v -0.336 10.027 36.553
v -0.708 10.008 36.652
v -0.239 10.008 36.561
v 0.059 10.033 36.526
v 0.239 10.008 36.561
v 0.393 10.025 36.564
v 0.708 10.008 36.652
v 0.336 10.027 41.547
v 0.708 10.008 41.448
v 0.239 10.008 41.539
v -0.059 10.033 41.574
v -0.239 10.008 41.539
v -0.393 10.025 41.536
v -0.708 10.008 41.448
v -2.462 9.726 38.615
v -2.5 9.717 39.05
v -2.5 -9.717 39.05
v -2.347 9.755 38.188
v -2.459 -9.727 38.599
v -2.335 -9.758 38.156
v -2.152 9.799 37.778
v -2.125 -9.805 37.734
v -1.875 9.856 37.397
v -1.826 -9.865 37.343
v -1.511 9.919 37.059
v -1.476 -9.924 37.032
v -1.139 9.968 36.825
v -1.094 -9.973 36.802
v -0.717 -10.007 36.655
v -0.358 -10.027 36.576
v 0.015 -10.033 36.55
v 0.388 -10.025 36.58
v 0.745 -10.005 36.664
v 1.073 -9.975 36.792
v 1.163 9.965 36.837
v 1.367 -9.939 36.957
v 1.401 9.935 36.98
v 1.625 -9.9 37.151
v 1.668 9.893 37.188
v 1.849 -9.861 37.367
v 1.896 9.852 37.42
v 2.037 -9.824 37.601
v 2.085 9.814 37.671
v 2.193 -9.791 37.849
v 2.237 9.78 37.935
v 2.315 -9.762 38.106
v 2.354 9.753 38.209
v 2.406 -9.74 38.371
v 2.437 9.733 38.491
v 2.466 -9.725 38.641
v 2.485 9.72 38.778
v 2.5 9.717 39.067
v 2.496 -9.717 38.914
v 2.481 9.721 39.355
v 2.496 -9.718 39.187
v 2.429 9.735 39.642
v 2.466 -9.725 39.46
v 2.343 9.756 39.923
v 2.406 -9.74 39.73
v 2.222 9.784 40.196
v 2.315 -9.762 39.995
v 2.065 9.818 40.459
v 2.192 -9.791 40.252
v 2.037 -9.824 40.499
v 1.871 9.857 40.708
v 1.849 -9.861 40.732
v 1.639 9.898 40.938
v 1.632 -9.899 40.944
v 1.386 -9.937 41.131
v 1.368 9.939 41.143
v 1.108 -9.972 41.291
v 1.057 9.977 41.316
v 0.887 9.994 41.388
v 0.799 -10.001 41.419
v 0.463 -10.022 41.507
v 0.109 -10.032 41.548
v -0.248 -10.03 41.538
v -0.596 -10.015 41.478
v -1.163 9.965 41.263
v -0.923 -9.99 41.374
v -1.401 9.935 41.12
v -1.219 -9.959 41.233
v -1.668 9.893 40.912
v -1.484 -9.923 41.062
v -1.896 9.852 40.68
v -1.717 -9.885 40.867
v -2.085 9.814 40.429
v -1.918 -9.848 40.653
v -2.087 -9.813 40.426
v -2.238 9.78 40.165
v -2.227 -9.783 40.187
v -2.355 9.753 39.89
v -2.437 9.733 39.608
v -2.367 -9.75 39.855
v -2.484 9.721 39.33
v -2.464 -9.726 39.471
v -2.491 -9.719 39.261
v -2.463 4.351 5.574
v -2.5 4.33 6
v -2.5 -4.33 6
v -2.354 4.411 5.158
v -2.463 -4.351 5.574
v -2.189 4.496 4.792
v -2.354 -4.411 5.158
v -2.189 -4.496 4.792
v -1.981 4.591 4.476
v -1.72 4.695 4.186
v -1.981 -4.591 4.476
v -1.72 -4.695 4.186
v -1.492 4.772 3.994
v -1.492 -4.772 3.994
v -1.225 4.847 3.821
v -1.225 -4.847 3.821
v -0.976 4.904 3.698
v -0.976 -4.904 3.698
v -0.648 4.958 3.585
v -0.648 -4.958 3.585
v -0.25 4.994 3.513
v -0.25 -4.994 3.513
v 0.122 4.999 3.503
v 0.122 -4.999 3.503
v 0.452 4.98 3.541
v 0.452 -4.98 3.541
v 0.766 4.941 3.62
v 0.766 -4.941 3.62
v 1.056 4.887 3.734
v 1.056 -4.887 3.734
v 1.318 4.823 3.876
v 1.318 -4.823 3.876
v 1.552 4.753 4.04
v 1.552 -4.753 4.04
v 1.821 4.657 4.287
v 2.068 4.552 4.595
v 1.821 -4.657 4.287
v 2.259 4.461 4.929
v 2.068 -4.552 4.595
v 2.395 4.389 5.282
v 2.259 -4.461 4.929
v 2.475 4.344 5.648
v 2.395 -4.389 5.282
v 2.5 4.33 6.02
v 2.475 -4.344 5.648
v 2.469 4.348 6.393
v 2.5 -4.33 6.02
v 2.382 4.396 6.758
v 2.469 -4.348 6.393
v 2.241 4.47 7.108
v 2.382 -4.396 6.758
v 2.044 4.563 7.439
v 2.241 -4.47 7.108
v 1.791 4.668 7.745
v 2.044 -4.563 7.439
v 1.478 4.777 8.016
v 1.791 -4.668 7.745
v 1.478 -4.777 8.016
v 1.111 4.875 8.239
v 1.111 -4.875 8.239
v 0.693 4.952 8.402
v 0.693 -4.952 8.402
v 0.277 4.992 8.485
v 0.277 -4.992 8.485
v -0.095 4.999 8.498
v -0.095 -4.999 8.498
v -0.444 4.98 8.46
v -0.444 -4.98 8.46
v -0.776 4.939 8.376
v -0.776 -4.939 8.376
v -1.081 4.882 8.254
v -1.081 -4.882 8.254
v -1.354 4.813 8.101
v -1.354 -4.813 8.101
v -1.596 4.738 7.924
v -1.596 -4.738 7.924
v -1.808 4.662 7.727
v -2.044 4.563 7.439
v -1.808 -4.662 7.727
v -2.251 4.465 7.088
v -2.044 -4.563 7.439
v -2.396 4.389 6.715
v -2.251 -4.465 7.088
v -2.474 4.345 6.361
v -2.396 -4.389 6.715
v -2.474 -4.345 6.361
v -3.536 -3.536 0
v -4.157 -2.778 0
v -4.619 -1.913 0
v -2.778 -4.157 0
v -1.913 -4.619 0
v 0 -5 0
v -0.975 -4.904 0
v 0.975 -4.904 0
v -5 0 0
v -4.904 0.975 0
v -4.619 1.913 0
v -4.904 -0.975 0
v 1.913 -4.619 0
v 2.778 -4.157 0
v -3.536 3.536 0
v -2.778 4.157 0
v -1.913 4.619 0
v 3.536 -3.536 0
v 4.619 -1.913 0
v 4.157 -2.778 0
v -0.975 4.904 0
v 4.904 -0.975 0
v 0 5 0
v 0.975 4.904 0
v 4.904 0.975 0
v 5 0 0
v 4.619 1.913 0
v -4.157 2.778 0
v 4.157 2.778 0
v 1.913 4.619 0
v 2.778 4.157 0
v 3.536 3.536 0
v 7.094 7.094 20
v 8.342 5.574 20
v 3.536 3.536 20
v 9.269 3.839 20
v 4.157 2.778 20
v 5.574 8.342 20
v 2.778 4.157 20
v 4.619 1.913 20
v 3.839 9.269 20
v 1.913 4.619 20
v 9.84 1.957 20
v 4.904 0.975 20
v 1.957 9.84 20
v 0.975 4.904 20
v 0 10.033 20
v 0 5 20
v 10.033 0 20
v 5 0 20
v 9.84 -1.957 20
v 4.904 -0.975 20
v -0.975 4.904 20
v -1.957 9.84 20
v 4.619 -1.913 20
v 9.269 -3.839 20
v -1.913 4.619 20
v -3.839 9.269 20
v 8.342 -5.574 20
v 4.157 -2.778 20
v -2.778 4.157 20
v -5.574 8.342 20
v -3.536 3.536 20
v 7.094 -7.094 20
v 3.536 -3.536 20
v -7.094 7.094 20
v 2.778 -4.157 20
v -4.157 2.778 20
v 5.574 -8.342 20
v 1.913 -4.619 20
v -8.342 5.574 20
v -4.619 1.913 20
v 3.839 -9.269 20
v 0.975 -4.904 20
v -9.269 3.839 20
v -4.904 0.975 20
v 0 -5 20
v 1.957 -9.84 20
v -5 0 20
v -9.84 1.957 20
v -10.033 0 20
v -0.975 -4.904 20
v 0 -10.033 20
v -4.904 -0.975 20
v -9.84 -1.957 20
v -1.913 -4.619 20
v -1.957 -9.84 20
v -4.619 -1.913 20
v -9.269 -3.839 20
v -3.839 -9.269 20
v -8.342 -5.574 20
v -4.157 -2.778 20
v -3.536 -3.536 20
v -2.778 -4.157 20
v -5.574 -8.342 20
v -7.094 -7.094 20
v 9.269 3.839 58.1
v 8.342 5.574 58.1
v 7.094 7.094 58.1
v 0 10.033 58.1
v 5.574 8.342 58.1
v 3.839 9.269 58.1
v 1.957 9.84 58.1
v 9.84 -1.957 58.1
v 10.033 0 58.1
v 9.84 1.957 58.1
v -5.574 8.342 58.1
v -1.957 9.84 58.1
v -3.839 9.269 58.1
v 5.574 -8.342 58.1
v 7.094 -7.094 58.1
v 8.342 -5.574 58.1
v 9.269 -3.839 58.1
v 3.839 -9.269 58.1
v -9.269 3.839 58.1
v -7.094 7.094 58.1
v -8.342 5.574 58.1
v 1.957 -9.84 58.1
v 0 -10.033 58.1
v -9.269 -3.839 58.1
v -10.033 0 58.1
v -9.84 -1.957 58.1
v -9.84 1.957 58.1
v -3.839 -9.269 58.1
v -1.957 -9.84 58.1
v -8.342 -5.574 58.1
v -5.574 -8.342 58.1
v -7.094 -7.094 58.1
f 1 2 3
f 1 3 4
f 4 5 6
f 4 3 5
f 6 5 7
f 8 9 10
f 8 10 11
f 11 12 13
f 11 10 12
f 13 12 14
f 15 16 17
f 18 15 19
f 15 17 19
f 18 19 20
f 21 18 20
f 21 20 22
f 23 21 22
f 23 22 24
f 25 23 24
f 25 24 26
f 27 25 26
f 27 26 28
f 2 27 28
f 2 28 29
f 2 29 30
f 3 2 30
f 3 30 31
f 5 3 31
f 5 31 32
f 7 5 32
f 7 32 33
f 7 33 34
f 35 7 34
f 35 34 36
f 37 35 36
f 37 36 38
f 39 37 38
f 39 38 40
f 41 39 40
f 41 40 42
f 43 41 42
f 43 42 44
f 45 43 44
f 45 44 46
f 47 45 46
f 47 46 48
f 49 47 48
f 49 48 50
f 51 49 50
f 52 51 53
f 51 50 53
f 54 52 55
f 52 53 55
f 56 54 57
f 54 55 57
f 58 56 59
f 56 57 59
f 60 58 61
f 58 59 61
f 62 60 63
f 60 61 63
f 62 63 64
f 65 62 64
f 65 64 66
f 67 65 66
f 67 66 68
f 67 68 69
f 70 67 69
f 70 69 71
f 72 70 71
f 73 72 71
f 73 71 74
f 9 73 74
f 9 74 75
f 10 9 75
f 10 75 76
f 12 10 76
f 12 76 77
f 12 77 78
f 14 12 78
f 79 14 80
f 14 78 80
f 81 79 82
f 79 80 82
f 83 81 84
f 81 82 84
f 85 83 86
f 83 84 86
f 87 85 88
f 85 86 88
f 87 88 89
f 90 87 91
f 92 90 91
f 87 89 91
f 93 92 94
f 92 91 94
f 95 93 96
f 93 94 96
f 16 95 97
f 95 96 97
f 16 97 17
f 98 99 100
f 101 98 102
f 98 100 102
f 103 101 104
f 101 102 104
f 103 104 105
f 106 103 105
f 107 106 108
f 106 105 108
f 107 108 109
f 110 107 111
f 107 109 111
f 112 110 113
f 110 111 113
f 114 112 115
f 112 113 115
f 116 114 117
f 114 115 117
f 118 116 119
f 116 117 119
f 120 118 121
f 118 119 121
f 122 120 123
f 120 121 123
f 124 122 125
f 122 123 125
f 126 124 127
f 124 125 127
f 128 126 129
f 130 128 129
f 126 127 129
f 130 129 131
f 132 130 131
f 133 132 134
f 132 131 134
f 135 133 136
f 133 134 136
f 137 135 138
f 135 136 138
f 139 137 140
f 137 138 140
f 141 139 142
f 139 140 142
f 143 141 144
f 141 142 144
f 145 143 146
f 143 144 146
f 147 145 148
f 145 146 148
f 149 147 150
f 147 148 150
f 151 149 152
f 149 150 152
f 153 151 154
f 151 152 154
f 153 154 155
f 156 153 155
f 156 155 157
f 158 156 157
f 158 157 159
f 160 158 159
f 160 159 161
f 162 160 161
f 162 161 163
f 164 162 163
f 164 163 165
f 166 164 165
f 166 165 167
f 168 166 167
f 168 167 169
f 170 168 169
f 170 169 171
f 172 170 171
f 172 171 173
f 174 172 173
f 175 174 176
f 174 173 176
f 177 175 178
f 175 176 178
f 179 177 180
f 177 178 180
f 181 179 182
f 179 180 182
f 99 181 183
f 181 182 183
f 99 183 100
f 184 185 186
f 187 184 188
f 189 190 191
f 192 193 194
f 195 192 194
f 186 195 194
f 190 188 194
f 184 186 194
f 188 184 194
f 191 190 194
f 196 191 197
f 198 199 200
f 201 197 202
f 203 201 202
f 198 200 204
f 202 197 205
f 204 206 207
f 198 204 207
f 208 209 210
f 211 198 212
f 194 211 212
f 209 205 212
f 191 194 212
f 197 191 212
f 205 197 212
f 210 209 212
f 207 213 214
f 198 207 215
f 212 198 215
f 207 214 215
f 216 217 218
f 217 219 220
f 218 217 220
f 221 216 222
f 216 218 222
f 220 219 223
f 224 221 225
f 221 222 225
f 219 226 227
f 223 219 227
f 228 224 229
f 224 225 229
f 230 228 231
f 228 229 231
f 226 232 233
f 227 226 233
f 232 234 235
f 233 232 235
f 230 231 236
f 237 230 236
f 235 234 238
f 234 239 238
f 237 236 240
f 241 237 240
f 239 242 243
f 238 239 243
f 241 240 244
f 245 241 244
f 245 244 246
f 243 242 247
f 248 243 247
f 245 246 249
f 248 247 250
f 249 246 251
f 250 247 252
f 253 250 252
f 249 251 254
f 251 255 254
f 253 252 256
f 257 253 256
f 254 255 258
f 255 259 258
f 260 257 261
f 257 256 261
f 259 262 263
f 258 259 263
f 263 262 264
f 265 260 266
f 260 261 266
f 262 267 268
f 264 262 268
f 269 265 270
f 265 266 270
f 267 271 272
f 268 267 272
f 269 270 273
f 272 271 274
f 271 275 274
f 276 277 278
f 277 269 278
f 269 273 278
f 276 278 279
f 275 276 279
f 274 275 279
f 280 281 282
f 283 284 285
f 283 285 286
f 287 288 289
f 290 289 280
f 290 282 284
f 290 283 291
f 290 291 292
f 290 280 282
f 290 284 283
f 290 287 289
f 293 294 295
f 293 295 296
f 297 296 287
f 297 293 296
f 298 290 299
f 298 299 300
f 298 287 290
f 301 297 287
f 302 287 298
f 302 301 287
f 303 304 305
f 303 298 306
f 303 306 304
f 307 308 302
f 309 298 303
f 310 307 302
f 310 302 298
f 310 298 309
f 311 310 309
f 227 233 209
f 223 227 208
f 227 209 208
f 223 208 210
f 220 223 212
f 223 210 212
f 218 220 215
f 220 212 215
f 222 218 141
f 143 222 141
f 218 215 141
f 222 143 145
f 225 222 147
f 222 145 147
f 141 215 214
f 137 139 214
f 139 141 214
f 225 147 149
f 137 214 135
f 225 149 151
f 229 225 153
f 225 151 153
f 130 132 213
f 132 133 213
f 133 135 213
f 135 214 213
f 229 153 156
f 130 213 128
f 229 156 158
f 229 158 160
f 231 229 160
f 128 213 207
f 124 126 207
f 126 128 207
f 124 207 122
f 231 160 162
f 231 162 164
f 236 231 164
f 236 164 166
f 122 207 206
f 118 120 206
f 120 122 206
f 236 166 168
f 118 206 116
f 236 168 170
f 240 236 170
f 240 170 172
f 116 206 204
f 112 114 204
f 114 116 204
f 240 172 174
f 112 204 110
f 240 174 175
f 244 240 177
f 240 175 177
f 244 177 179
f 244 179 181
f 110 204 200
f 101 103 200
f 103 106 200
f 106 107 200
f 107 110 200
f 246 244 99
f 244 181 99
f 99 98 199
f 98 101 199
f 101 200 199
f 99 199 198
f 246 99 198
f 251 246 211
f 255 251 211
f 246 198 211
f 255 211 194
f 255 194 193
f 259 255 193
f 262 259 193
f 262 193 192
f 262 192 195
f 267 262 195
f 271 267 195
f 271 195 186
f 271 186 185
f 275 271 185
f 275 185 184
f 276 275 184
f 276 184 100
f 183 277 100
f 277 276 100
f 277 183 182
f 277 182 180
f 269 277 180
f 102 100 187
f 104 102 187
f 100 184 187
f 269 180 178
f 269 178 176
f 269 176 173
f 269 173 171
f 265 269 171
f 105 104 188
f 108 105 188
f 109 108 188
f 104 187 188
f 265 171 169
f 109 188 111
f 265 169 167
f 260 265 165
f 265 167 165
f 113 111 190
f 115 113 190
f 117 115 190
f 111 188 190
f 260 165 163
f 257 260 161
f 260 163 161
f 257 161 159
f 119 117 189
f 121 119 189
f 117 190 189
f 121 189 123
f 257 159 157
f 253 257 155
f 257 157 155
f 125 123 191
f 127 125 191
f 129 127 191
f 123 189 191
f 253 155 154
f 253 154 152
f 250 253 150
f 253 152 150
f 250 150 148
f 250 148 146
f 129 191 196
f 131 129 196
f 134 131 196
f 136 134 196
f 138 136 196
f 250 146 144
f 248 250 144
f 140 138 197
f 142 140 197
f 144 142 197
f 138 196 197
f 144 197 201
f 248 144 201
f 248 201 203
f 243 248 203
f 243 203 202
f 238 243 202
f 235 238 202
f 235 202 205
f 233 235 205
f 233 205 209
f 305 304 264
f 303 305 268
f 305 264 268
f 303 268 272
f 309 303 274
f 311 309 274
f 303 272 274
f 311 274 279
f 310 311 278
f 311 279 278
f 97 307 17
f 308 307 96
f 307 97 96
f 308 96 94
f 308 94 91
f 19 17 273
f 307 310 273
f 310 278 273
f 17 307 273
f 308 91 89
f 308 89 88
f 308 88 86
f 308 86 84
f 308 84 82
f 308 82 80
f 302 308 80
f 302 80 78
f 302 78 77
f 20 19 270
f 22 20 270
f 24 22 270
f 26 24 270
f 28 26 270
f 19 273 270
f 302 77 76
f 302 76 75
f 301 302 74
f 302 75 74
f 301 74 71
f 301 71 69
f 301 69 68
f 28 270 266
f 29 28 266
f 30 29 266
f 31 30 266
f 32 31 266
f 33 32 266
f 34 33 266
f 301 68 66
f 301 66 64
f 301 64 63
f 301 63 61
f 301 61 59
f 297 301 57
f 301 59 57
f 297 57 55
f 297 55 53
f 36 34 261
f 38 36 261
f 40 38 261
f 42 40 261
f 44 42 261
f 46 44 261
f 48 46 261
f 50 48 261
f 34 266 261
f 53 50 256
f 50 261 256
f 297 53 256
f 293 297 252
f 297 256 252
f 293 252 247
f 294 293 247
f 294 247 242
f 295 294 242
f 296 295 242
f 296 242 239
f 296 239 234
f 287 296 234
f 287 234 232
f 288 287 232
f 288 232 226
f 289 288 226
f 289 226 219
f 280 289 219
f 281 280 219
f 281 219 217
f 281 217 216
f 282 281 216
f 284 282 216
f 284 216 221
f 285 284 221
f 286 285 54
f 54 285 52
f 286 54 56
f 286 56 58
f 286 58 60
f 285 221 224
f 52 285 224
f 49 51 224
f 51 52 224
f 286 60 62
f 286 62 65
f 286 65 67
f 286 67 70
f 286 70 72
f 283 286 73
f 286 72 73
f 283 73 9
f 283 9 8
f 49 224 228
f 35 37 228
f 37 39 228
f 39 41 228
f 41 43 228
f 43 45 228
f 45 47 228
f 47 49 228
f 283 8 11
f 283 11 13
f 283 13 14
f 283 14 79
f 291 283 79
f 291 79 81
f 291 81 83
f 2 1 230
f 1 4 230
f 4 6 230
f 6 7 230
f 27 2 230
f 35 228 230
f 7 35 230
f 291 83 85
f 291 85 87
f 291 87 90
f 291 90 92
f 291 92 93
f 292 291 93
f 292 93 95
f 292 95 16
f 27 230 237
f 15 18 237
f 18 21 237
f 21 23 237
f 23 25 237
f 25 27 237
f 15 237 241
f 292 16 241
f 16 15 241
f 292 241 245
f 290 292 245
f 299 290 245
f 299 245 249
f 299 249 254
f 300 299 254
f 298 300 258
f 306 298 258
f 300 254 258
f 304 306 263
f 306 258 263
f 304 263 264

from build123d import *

# Parameters (mm, degrees)
SKETCH1_R                       = 5
BOSS_EXTRUDE1_DEPTH             = 20
SKETCH2_R                       = 10.033
BOSS_EXTRUDE2_DEPTH             = 38.1
F_5_0MM_DOWEL_HOLE1_D           = 5
F_5_0MM_DOWEL_HOLE1_CSINK_D     = 5.05
F_5_0MM_DOWEL_HOLE1_CSINK_ANGLE = 90


with BuildPart() as part:
    # Sketch1 → Boss-Extrude1 (new body)
    with BuildSketch(Plane.XY):
        Circle(SKETCH1_R)
    extrude(amount=BOSS_EXTRUDE1_DEPTH)

    # Sketch2 → Boss-Extrude2 (add)
    with BuildSketch(Plane.XY.offset(20)):
        with Locations(Location((0, 0, 0), (0, 0, 180))):
            Circle(SKETCH2_R)
    extrude(amount=BOSS_EXTRUDE2_DEPTH)

    # Ø5.0mm Dowel Hole1 (through all)
    with Locations(Plane(origin=(0, 10.033, 0), x_dir=(1, 0, 0), z_dir=(0, 1, 0))):
        with Locations((0, -6), (0, -39.05)):
            CounterSinkHole(F_5_0MM_DOWEL_HOLE1_D / 2, F_5_0MM_DOWEL_HOLE1_CSINK_D / 2, counter_sink_angle=F_5_0MM_DOWEL_HOLE1_CSINK_ANGLE)


solid = part.part
